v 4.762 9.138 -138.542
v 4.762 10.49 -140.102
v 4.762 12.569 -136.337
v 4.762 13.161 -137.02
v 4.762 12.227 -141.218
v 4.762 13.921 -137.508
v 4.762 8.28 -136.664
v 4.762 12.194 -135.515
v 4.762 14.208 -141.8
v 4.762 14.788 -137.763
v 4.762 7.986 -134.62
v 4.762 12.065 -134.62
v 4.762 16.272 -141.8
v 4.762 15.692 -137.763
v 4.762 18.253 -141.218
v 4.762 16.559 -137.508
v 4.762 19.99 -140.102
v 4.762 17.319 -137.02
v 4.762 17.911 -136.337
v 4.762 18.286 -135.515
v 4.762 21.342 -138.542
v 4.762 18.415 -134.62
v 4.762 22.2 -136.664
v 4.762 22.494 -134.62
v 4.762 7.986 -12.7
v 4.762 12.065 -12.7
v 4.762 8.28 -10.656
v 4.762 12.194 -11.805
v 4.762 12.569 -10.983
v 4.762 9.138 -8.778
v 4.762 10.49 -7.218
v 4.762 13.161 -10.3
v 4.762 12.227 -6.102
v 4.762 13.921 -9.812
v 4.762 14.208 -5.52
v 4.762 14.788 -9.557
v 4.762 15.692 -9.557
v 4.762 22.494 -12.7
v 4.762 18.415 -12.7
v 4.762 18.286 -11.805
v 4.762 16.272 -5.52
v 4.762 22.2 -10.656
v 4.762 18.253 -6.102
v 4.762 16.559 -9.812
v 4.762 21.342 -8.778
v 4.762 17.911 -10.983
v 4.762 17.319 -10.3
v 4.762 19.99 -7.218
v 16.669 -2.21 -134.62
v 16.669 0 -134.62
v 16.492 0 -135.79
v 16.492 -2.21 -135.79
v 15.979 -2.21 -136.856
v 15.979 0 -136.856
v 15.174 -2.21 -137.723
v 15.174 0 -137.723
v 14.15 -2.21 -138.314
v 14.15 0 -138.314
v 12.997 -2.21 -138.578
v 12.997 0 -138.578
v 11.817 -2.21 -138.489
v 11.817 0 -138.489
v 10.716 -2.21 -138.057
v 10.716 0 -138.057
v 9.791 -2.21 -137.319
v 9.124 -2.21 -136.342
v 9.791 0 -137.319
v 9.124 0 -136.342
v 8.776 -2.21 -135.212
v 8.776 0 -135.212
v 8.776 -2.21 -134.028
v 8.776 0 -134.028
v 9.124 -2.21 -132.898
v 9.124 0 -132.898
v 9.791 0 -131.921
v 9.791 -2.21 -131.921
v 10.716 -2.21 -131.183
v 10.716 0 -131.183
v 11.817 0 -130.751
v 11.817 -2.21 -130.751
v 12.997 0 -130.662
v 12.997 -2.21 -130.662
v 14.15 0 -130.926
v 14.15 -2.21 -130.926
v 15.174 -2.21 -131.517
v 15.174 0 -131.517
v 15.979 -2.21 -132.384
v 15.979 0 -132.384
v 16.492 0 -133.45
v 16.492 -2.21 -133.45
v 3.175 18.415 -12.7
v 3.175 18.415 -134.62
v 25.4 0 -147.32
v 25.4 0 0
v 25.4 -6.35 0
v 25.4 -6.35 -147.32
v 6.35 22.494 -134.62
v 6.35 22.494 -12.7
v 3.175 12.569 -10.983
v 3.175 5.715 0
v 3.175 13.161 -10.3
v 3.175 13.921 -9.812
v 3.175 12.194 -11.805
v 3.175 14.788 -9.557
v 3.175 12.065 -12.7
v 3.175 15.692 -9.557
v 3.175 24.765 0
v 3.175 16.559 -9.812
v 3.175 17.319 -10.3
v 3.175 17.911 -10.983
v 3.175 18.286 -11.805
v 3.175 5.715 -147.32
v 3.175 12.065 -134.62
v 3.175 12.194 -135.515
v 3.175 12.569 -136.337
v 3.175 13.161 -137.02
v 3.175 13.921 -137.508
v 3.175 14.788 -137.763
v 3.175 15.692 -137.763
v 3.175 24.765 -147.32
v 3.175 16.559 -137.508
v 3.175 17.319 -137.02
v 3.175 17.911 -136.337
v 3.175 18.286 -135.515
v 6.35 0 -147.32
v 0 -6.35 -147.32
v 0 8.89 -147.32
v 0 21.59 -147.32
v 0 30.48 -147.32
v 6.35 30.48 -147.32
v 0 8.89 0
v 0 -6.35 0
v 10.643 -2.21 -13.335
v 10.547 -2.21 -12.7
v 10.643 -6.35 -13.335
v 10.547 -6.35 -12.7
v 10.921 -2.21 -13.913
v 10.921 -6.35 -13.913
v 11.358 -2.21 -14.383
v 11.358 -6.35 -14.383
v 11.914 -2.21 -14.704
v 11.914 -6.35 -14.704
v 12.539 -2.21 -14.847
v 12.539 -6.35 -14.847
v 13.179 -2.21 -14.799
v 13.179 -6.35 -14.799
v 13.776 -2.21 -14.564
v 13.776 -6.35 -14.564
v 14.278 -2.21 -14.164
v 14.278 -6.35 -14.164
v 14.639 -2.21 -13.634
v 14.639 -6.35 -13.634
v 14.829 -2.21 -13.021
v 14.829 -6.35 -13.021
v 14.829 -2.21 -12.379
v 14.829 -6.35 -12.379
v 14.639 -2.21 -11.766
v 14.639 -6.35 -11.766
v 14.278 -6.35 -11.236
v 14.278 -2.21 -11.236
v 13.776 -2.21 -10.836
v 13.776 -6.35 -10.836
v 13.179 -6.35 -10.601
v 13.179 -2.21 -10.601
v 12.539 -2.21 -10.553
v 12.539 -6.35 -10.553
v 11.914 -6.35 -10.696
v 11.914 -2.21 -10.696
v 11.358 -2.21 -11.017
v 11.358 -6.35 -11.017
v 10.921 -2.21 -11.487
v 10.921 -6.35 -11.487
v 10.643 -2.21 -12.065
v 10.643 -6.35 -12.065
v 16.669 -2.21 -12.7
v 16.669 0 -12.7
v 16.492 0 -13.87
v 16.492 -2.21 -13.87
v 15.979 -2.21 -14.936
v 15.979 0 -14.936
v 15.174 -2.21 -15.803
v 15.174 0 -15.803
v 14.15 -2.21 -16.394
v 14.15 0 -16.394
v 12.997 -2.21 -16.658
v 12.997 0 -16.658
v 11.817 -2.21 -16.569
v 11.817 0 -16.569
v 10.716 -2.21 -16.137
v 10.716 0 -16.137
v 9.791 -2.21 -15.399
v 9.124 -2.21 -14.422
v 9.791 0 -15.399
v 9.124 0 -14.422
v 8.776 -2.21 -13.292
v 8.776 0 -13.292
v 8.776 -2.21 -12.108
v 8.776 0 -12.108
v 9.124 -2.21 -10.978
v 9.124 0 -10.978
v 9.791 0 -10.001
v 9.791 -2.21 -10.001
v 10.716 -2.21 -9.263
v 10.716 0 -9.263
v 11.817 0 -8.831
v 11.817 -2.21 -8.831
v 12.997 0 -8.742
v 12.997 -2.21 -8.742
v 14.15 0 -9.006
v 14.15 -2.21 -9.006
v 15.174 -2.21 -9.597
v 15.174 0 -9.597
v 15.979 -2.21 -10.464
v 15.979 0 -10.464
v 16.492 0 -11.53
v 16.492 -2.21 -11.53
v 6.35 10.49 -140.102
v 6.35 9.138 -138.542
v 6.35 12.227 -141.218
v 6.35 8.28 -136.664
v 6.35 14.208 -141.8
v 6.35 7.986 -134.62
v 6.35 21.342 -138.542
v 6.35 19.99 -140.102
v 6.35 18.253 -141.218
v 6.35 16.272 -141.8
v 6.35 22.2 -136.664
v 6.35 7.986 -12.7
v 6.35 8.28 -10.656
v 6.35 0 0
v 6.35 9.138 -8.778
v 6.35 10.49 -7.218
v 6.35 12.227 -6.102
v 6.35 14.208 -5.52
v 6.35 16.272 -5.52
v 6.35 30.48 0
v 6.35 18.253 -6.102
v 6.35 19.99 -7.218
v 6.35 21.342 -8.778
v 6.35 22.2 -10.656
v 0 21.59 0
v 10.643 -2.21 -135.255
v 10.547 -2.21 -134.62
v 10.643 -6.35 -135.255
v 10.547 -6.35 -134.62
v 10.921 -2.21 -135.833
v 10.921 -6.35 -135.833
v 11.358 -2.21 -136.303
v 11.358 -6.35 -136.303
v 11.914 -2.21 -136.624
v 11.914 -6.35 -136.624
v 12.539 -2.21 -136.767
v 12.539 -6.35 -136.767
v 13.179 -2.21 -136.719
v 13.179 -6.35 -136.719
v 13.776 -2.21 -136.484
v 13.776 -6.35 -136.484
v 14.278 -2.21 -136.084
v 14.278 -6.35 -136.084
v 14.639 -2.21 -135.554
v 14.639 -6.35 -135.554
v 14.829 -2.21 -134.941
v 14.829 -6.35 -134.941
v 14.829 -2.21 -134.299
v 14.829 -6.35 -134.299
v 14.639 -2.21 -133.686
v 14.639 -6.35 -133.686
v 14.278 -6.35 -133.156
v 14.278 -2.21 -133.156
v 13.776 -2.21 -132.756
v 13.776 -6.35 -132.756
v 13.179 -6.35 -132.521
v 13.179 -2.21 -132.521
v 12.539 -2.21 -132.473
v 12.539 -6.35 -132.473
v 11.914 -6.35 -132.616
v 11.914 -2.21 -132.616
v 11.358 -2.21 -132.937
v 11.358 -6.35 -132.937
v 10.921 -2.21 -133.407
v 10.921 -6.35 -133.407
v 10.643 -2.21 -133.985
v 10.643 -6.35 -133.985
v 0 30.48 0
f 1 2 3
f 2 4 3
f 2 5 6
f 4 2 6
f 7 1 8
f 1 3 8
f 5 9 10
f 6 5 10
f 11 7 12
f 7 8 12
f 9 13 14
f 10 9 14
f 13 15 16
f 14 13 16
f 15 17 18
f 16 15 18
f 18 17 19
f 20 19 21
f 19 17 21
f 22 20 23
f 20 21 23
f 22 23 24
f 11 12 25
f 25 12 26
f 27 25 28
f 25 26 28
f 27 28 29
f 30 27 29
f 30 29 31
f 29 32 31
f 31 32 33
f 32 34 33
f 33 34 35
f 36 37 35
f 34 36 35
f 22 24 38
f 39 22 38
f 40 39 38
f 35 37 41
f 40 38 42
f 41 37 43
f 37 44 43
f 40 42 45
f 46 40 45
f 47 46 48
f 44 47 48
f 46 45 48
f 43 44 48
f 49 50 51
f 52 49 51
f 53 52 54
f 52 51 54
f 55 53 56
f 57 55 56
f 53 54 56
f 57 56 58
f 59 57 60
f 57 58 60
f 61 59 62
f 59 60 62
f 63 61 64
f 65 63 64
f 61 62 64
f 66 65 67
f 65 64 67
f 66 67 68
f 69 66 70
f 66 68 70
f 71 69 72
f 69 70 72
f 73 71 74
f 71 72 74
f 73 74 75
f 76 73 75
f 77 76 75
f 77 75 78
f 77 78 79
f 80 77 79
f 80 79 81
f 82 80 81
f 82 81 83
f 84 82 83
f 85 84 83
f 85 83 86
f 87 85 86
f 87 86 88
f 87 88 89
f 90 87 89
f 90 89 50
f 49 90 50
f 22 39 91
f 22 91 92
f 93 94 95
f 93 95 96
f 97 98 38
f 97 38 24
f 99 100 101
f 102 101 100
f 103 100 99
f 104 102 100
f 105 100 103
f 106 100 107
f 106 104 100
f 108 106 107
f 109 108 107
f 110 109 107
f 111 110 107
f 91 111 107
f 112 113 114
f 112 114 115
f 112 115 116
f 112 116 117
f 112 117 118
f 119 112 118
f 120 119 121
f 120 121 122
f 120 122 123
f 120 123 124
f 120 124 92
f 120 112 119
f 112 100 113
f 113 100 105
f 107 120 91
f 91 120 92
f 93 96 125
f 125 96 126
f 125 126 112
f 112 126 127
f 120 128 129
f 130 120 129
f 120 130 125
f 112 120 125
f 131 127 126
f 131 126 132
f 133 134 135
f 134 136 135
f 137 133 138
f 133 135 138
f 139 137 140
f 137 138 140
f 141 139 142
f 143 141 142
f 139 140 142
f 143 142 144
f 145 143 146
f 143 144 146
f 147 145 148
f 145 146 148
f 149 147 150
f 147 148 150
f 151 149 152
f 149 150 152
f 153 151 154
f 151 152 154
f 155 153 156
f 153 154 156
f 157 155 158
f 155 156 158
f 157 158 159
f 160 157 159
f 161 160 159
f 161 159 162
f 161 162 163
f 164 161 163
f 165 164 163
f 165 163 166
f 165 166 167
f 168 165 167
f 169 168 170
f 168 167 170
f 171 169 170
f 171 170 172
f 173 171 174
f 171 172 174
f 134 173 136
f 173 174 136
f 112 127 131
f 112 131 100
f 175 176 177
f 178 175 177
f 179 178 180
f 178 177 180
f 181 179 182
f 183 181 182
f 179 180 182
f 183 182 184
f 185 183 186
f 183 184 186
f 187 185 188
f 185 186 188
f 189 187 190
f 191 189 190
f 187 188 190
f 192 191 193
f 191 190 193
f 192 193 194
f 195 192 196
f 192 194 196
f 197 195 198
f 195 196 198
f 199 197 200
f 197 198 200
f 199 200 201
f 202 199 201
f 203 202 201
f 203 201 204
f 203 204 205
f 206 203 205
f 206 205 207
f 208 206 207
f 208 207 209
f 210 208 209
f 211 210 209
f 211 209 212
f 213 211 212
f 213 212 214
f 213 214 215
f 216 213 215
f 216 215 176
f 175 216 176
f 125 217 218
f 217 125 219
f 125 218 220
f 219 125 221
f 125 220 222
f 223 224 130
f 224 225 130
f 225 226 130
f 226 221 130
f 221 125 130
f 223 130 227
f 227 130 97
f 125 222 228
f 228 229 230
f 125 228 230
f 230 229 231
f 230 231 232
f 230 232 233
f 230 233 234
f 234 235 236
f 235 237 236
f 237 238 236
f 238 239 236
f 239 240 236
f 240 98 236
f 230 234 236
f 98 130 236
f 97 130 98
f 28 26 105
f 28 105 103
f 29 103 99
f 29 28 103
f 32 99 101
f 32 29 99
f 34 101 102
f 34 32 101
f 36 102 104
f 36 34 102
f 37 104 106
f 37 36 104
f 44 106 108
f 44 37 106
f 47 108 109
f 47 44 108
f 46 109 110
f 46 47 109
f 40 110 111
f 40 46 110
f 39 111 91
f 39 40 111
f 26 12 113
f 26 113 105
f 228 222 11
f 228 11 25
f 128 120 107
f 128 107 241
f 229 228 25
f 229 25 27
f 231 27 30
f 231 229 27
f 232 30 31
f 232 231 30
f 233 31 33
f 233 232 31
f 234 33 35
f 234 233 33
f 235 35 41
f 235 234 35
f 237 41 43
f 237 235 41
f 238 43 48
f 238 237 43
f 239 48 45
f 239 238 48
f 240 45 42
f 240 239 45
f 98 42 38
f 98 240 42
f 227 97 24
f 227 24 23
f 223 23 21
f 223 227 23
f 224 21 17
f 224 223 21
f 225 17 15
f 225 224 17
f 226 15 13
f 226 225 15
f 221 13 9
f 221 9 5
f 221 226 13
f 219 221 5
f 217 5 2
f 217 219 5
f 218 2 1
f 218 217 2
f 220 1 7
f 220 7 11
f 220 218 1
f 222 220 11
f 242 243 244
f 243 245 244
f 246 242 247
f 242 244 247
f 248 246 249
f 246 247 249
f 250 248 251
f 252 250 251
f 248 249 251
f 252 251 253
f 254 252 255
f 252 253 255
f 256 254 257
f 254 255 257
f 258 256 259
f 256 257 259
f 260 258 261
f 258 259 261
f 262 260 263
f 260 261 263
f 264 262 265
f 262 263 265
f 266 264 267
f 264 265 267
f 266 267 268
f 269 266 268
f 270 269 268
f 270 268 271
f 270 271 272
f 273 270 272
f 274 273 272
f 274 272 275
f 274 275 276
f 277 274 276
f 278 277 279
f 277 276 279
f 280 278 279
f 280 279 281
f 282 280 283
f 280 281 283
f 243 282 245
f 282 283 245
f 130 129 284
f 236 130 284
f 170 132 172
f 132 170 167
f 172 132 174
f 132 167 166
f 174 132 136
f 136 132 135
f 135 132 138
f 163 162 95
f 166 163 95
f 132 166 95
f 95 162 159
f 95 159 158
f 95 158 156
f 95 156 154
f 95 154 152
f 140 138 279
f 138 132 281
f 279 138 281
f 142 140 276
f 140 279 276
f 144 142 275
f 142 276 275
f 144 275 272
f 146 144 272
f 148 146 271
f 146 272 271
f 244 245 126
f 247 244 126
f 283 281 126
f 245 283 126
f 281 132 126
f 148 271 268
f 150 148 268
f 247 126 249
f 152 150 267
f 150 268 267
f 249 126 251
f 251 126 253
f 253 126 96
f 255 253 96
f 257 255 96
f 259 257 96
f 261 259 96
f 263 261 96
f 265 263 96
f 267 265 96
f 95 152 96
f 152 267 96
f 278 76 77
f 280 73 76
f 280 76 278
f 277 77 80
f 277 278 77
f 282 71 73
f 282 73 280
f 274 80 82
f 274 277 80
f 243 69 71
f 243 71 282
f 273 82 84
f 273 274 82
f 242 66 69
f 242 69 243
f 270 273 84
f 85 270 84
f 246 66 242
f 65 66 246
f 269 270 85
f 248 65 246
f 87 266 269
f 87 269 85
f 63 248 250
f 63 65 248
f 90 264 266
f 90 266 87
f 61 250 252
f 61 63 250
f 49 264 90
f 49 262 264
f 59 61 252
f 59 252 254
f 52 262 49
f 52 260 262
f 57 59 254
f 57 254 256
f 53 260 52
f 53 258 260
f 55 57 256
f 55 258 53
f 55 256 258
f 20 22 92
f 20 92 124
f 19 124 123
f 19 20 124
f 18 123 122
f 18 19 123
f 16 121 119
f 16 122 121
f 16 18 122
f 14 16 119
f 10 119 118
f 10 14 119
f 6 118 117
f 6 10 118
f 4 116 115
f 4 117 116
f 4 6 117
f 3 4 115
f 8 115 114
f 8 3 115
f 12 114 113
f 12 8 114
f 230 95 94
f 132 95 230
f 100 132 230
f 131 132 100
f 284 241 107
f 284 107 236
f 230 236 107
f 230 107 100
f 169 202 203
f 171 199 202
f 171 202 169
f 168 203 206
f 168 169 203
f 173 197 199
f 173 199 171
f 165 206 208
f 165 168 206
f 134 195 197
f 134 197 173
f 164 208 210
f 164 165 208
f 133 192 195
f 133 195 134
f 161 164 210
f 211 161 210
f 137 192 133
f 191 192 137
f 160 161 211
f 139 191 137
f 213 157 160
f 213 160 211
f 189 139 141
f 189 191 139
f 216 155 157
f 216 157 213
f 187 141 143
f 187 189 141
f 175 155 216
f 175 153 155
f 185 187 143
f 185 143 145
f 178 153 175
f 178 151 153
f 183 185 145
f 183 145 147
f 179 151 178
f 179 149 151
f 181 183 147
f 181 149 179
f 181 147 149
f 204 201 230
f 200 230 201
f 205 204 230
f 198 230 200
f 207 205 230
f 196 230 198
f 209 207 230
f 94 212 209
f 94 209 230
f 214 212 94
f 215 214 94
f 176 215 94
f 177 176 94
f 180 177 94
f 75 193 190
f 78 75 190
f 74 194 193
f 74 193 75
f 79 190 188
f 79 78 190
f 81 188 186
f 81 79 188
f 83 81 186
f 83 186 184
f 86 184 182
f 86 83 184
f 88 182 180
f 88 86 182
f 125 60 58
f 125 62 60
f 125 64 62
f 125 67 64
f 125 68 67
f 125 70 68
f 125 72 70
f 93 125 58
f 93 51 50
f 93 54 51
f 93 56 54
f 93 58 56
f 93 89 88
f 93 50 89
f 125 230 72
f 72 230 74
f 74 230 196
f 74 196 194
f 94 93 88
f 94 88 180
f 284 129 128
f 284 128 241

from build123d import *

# Parameters (mm, degrees)
SKETCH1_W                                           = 25.4
SKETCH1_H                                           = 147.32
BOSS_EXTRUDE1_DEPTH                                 = 6.35
SKETCH2_W                                           = 147.32
SKETCH2_H                                           = 30.48
BOSS_EXTRUDE2_DEPTH                                 = 6.35
CBORE_FOR_6_BINDING_HEAD_MACHINE_SCREW1_D           = 4.3053
CBORE_FOR_6_BINDING_HEAD_MACHINE_SCREW1_CBORE_D     = 7.9375
CBORE_FOR_6_BINDING_HEAD_MACHINE_SCREW1_CBORE_DEPTH = 2.2098
CUT_EXTRUDE1_DEPTH                                  = 152.641403647
CUT_EXTRUDE2_DEPTH                                  = 1.5875
CUT_EXTRUDE3_DEPTH                                  = 153.569239364


with BuildPart() as part:
    # Sketch1 → Boss-Extrude1 (new body)
    with BuildSketch(Plane(origin=(0, 0, 0), x_dir=(1, 0, 0), z_dir=(0, 1, 0))):
        with Locations((12.7, 73.66)):
            Rectangle(SKETCH1_W, SKETCH1_H)
    extrude(amount=-BOSS_EXTRUDE1_DEPTH)

    # Sketch2 → Boss-Extrude2 (add)
    with BuildSketch(Plane.ZY):
        with Locations((-73.66, 15.24)):
            Rectangle(SKETCH2_W, SKETCH2_H)
    extrude(amount=-BOSS_EXTRUDE2_DEPTH)

    # CBORE for #6 Binding Head Machine Screw1 (through all)
    with Locations(Plane(origin=(0, 0, 0), x_dir=(1, 0, 0), z_dir=(0, 1, 0))):
        with Locations((12.7, 12.7), (12.7, 134.62)):
            CounterBoreHole(CBORE_FOR_6_BINDING_HEAD_MACHINE_SCREW1_D / 2, CBORE_FOR_6_BINDING_HEAD_MACHINE_SCREW1_CBORE_D / 2, CBORE_FOR_6_BINDING_HEAD_MACHINE_SCREW1_CBORE_DEPTH)

    # Sketch9 → Cut-Extrude1 (cut, through all)
    with BuildSketch(Plane(origin=(6.35, 0, 0), x_dir=(0, 0, -1), z_dir=(1, 0, 0))):
        with BuildLine():
            Line((12.7, 18.415), (134.62, 18.415))
            ThreePointArc((134.62, 18.415), (137.795, 15.24), (134.62, 12.065))
            Line((134.62, 12.065), (12.7, 12.065))
            ThreePointArc((12.7, 12.065), (9.525, 15.24), (12.7, 18.415))
        make_face()
    extrude(amount=-CUT_EXTRUDE1_DEPTH, mode=Mode.SUBTRACT)

    # Sketch12 → Cut-Extrude2 (cut)
    with BuildSketch(Plane(origin=(6.35, 0, 0), x_dir=(0, 0, -1), z_dir=(1, 0, 0))):
        with BuildLine():
            Line((12.7, 22.493732), (134.62, 22.493732))
            ThreePointArc((134.62, 22.493732), (141.873732, 15.24), (134.62, 7.986268))
            Line((134.62, 7.986268), (12.7, 7.986268))
            ThreePointArc((12.7, 7.986268), (5.446268, 15.24), (12.7, 22.493732))
        make_face()
    extrude(amount=-CUT_EXTRUDE2_DEPTH, mode=Mode.SUBTRACT)

    # Sketch13 → Cut-Extrude3 (cut, through all)
    with BuildSketch(Plane(origin=(0, 0, -147.32), x_dir=(-1, 0, 0), z_dir=(0, 0, -1))):
        Polygon((0, 21.59), (0, 8.89), (-3.175, 5.715), (-3.175, 24.765), align=None)
    extrude(amount=-CUT_EXTRUDE3_DEPTH, mode=Mode.SUBTRACT)


solid = part.part
